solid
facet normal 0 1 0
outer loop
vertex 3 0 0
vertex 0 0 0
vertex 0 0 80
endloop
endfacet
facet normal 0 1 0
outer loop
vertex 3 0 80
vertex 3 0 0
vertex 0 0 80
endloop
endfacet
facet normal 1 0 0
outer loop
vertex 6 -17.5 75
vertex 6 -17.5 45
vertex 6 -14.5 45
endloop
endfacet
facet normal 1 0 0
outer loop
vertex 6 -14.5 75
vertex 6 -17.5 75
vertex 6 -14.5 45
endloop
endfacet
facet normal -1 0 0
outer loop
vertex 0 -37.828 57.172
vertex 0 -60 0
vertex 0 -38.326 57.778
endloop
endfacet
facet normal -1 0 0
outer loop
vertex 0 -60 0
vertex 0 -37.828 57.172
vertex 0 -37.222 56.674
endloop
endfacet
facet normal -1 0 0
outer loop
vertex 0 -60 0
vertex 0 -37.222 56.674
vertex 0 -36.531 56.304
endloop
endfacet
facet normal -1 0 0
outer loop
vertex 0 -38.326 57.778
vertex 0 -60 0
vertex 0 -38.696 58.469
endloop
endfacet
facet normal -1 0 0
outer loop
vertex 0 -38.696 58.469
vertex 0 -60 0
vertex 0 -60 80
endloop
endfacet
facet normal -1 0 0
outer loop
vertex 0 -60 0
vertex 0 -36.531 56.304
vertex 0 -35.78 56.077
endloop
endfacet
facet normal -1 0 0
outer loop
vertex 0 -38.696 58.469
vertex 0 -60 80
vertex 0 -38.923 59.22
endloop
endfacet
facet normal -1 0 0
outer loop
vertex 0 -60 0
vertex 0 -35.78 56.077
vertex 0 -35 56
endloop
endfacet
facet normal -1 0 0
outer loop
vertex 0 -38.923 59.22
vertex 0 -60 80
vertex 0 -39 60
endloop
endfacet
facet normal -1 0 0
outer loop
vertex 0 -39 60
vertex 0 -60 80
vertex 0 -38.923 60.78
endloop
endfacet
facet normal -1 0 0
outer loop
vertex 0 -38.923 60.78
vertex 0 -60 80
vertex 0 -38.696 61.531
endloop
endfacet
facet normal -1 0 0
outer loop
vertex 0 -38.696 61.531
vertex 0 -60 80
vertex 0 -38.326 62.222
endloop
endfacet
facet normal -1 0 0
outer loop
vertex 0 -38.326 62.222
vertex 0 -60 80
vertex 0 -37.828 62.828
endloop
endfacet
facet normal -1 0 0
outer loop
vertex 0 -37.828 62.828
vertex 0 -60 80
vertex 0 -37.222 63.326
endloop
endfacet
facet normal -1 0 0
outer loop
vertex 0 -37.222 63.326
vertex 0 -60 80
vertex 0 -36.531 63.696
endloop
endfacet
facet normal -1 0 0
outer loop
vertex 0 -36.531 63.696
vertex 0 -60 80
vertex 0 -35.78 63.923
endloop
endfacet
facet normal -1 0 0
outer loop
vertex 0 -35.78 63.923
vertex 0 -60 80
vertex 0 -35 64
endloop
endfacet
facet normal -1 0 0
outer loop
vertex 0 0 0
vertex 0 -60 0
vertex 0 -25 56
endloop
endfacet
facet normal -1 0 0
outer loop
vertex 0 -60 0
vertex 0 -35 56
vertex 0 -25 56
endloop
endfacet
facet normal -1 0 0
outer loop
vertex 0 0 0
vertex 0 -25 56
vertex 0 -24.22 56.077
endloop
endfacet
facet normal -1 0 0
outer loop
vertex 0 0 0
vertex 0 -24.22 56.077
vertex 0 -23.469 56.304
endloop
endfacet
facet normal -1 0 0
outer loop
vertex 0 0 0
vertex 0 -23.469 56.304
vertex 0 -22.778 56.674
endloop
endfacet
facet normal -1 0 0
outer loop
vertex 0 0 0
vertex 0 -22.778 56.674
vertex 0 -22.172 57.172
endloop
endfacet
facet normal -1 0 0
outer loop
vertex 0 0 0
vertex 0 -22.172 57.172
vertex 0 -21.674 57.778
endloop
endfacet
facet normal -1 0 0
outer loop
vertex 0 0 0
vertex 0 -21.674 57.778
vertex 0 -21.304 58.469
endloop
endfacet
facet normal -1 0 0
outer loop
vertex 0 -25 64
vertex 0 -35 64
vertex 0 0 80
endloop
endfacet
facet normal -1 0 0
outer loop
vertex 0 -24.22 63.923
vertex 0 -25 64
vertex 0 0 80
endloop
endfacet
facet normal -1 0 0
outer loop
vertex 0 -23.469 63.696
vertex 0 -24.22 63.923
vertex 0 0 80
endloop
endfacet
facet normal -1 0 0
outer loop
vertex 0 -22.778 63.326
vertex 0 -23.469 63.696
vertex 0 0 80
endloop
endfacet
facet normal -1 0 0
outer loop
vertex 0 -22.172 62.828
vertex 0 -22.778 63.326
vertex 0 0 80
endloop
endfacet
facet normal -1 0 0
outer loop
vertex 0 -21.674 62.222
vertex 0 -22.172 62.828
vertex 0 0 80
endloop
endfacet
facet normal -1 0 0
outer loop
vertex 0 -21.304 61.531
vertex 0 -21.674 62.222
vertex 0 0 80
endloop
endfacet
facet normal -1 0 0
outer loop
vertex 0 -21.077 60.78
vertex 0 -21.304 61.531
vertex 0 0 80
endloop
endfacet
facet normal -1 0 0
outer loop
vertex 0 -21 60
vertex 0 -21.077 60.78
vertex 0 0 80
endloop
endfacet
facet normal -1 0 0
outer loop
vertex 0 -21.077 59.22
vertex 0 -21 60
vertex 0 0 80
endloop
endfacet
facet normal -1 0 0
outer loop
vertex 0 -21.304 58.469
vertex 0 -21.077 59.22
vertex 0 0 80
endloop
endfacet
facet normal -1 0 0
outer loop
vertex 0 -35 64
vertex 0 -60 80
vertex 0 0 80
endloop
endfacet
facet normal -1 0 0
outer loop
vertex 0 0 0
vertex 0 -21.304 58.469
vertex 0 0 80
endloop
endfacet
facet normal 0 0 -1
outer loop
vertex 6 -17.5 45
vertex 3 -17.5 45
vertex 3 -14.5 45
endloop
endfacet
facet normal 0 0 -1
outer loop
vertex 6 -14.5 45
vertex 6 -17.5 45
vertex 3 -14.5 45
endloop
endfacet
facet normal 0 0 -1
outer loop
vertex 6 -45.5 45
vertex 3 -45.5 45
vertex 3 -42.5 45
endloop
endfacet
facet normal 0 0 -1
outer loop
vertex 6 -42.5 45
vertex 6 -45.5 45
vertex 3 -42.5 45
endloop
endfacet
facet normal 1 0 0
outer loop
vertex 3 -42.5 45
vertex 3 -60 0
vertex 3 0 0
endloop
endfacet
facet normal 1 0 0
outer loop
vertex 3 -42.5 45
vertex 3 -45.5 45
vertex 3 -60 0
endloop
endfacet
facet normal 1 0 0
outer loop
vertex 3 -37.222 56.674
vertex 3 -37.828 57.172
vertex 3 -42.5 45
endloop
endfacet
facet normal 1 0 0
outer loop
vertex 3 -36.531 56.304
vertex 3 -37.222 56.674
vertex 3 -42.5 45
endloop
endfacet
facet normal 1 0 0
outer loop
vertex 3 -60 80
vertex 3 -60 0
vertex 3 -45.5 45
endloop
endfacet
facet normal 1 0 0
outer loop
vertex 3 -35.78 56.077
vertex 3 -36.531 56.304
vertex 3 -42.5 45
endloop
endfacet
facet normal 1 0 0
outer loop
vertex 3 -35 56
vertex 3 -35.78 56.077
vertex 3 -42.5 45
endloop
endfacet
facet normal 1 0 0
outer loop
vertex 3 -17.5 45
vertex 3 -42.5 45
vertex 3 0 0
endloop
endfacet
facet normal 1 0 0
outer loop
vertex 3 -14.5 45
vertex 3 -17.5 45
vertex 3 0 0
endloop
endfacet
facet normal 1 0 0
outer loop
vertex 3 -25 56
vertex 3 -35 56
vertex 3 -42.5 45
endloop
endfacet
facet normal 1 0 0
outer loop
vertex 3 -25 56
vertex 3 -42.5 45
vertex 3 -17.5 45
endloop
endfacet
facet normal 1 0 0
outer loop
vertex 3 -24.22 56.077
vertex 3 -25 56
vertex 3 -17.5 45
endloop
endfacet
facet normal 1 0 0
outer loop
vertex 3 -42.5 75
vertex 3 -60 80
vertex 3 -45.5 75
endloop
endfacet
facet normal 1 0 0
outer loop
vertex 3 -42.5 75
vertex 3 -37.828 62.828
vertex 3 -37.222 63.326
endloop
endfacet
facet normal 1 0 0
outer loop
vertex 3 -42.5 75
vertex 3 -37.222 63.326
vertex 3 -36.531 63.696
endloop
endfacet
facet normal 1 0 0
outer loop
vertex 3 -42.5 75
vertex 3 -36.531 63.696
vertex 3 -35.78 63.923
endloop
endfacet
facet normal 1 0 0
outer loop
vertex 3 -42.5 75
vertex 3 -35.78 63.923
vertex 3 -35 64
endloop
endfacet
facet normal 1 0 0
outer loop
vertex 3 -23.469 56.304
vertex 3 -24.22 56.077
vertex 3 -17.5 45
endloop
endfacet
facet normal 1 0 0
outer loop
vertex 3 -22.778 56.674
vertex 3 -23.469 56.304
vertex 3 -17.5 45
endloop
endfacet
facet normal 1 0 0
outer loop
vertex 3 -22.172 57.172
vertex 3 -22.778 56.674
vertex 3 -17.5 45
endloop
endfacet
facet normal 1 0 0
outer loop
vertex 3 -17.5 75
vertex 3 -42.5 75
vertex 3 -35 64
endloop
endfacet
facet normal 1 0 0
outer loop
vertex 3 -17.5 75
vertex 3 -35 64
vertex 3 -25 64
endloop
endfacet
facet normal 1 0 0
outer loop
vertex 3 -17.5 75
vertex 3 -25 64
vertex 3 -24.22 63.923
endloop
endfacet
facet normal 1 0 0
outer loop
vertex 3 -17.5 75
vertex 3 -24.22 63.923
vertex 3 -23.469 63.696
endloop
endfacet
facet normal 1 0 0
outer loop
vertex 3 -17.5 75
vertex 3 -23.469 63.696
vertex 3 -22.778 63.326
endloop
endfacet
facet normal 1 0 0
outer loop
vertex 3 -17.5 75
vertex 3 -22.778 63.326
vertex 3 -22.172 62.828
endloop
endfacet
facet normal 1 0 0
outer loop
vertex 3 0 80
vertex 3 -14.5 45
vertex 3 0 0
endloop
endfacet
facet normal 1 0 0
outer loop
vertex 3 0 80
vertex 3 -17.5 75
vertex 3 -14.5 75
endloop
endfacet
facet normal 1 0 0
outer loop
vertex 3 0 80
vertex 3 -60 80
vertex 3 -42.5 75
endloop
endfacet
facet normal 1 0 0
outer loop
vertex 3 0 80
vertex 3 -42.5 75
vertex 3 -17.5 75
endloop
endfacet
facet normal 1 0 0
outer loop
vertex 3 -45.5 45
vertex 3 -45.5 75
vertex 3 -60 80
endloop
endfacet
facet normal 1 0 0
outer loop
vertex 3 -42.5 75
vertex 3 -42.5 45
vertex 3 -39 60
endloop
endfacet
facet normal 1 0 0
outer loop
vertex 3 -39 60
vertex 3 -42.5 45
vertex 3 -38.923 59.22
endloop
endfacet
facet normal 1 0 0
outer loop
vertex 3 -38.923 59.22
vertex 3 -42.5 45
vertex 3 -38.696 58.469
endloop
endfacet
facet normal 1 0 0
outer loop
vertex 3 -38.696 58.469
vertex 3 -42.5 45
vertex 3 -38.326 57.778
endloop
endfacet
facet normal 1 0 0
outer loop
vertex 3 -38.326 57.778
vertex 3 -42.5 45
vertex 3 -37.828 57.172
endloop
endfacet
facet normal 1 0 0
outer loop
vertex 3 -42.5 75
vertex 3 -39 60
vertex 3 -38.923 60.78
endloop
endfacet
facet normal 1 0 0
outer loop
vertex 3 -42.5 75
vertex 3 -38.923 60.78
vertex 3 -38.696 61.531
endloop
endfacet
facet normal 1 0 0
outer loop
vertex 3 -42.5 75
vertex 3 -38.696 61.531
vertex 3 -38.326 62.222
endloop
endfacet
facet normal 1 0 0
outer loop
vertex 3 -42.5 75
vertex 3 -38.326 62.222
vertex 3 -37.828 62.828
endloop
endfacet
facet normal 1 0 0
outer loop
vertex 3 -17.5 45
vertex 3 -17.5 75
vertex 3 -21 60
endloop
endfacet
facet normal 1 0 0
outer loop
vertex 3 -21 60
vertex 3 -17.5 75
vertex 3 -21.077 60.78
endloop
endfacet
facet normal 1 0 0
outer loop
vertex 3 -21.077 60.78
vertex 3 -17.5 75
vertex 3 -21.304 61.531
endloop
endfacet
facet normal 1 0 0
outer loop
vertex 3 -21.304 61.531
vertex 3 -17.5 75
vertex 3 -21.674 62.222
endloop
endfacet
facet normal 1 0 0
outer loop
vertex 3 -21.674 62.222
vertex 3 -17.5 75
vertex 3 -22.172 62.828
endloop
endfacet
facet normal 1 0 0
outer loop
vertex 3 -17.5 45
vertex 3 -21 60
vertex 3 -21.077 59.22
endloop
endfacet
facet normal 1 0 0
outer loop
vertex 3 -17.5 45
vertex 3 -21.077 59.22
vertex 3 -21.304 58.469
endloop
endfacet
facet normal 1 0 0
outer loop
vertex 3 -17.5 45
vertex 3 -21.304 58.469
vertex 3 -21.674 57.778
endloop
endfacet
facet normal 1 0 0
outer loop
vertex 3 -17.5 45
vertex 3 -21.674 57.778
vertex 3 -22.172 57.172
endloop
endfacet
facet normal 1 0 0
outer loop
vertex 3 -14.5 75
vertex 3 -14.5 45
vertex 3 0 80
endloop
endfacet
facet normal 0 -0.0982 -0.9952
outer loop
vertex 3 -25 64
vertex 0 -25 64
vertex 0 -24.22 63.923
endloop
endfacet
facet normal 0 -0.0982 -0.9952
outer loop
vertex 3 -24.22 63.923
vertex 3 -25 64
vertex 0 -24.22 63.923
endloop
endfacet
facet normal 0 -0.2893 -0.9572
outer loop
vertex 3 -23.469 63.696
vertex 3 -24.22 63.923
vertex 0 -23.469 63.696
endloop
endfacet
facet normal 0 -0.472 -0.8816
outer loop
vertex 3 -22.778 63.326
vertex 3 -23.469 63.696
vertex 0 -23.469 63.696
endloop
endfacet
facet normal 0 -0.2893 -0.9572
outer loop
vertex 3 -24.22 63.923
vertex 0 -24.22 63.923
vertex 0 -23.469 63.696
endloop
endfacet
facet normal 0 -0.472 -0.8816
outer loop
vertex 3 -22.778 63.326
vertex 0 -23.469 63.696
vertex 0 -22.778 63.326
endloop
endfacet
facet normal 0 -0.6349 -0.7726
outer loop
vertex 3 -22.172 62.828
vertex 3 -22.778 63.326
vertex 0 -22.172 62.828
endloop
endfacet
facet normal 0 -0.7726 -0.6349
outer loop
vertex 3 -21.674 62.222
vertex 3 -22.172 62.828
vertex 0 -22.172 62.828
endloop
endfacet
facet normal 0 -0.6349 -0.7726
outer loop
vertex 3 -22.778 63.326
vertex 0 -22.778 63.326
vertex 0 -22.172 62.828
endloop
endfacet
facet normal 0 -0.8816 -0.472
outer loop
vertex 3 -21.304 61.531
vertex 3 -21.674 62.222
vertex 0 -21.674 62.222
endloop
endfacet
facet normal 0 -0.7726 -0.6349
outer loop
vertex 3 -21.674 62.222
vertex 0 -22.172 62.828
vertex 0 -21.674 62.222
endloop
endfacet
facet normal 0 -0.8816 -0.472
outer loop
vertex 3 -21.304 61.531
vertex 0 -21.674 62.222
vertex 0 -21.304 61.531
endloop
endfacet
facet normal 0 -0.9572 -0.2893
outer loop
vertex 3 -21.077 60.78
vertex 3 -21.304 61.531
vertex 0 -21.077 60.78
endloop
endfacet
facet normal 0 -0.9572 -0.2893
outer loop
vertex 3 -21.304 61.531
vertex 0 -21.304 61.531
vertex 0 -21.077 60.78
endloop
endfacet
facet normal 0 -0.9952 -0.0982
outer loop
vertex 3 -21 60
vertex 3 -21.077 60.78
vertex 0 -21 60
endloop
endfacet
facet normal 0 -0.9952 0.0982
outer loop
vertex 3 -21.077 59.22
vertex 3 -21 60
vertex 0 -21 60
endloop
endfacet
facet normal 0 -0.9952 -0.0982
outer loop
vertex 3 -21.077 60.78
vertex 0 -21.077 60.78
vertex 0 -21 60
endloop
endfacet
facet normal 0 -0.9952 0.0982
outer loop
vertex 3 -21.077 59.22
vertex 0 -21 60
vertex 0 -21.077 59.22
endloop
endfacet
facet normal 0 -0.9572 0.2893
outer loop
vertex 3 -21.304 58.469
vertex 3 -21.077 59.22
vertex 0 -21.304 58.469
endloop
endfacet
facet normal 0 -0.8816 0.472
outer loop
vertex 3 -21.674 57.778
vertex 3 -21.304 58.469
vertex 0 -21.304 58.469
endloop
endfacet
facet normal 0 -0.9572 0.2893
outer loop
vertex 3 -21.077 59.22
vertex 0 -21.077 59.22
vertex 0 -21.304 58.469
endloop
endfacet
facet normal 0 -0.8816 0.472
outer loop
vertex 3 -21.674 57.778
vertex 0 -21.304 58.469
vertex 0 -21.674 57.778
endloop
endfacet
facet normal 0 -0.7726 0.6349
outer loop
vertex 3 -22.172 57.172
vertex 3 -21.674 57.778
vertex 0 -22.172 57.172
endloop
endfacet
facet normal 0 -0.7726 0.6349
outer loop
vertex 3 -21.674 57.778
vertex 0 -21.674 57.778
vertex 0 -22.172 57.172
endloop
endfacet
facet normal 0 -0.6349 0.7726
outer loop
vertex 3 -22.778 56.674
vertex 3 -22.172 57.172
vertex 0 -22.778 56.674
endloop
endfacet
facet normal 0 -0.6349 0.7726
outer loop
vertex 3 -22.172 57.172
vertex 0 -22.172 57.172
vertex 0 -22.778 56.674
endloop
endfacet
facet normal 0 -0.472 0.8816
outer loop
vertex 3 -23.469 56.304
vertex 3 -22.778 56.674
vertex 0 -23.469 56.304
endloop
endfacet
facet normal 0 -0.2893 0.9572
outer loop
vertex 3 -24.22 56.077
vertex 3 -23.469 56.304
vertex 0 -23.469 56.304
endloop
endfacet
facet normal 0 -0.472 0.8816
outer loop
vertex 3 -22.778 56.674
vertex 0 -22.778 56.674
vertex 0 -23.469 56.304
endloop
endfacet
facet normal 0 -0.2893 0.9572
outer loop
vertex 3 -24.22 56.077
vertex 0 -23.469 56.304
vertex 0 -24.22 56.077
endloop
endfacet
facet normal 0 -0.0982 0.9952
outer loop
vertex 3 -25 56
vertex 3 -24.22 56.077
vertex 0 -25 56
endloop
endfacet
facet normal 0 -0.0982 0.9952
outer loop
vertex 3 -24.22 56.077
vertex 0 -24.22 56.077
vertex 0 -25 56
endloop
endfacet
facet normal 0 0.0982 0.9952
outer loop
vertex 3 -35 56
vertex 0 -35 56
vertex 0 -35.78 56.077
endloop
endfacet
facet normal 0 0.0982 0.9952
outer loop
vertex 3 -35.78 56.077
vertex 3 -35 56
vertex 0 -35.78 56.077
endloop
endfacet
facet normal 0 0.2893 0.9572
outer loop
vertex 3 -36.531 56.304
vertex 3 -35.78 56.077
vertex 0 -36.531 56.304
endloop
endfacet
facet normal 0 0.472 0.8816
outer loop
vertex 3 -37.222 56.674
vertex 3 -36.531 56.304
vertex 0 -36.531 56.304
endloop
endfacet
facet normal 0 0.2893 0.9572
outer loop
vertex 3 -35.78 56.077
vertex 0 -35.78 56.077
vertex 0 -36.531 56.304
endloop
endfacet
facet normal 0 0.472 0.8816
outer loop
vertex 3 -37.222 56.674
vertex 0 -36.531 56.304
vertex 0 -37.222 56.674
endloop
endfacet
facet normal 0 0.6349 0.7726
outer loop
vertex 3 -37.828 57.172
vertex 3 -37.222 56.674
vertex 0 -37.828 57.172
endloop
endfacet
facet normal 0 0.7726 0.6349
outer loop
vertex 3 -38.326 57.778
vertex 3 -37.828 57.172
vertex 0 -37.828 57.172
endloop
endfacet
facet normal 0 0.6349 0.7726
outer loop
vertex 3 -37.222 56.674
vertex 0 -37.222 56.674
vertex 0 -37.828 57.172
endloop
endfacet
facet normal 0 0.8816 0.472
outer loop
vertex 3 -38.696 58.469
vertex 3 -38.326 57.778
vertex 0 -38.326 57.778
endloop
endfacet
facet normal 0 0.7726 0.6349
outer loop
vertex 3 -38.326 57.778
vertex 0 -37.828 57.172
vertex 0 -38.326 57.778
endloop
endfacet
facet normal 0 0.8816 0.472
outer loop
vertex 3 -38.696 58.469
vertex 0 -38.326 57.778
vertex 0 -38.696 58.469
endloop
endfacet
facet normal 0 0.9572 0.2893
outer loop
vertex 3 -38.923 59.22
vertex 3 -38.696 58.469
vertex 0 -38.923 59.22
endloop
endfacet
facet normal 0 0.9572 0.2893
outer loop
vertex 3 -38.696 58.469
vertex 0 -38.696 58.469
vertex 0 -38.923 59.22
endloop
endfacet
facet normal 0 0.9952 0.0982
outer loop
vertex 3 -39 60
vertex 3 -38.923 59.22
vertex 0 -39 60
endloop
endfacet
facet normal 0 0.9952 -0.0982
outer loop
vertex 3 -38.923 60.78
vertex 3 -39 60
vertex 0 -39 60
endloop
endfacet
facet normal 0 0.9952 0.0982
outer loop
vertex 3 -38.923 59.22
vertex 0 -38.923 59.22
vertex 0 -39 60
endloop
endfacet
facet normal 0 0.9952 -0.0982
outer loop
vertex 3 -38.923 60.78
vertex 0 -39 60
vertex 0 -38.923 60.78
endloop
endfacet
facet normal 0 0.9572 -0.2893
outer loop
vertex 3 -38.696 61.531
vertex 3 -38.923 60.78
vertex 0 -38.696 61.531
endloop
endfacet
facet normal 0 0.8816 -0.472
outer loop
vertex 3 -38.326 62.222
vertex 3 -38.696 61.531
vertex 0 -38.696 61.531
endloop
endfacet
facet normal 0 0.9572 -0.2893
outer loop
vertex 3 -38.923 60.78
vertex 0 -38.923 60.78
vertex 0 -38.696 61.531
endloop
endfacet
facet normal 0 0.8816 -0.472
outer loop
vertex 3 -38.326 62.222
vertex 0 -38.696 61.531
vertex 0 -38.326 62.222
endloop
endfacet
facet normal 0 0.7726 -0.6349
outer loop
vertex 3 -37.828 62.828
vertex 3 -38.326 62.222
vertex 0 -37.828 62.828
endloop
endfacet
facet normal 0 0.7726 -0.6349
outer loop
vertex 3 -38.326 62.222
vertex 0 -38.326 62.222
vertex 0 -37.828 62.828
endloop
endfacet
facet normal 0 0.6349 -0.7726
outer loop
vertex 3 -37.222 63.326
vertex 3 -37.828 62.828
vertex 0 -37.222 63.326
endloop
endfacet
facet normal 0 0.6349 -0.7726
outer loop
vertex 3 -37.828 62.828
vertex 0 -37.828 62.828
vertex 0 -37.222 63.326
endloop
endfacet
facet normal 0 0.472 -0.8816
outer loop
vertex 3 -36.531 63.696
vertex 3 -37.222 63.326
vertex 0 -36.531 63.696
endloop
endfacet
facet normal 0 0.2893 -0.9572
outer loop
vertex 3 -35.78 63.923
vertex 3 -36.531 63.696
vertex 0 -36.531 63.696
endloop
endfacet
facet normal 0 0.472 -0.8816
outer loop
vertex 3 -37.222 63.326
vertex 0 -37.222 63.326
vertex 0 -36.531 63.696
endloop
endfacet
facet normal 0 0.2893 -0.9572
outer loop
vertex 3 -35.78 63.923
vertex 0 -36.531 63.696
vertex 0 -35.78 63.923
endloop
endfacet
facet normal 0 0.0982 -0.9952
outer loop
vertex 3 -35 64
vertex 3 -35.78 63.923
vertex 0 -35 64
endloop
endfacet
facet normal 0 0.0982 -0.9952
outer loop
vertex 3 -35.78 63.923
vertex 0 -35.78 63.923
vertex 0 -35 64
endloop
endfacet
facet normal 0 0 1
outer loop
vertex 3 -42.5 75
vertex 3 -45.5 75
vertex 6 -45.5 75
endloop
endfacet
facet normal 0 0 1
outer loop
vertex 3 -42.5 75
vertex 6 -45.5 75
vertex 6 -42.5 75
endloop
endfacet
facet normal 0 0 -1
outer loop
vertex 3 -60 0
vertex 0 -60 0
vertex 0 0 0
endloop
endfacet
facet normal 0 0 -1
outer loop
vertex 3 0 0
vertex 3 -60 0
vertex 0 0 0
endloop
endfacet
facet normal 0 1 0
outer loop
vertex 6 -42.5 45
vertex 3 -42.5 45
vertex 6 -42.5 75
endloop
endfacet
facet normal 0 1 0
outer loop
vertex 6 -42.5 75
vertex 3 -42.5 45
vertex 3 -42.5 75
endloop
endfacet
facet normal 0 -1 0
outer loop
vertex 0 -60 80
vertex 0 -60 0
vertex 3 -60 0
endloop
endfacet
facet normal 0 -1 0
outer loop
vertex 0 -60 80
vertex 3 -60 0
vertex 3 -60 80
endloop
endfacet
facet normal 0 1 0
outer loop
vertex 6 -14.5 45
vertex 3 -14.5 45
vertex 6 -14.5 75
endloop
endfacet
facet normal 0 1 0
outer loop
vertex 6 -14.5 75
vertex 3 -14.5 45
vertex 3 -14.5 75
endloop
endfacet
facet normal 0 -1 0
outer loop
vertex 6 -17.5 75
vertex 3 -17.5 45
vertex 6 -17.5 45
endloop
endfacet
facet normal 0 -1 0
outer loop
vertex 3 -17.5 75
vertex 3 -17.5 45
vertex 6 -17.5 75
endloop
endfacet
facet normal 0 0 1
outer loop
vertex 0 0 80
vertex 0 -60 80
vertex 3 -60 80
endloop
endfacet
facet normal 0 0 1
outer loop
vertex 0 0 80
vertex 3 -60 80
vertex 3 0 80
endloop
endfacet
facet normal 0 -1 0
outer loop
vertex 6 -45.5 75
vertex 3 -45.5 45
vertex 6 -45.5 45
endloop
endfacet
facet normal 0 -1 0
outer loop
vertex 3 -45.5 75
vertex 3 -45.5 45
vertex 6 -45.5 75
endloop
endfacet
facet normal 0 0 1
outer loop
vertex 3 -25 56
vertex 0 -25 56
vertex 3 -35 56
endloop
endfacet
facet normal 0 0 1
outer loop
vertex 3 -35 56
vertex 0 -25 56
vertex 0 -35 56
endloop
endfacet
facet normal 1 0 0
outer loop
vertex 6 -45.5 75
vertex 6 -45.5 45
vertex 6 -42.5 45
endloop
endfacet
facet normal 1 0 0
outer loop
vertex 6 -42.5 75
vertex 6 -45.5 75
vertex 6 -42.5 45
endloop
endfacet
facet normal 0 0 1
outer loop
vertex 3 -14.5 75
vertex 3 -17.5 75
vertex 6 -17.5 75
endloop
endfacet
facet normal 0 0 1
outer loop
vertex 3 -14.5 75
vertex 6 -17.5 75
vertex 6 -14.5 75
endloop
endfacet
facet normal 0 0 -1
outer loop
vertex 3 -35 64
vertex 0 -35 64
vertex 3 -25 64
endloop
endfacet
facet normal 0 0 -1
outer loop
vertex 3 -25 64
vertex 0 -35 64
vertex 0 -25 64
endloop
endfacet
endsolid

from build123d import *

# Parameters (mm, degrees)
F0_W     = 60
F0_H     = 80
F1_DEPTH = 3
F2_W     = 3
F2_H     = 30
F3_DEPTH = 3


with BuildPart() as f1:
    # F0 (on Right) → F1 (new body)
    with BuildSketch(Plane.YZ):
        with Locations((-30, 40)):
            Rectangle(F0_W, F0_H)
        with BuildLine():
            ThreePointArc((-35, 56), (-39, 60), (-35, 64))
            Line((-35, 64), (-25, 64))
            ThreePointArc((-25, 64), (-21, 60), (-25, 56))
            Line((-25, 56), (-35, 56))
        make_face(mode=Mode.SUBTRACT)
    extrude(amount=F1_DEPTH)

    # F2 (on face) → F3 (join)
    with BuildSketch(Plane.YZ.offset(3)):
        with Locations((-44, 60)):
            Rectangle(F2_W, F2_H)
        with Locations((-16, 60)):
            Rectangle(F2_W, F2_H)
    extrude(amount=F3_DEPTH)


solid = f1.part
